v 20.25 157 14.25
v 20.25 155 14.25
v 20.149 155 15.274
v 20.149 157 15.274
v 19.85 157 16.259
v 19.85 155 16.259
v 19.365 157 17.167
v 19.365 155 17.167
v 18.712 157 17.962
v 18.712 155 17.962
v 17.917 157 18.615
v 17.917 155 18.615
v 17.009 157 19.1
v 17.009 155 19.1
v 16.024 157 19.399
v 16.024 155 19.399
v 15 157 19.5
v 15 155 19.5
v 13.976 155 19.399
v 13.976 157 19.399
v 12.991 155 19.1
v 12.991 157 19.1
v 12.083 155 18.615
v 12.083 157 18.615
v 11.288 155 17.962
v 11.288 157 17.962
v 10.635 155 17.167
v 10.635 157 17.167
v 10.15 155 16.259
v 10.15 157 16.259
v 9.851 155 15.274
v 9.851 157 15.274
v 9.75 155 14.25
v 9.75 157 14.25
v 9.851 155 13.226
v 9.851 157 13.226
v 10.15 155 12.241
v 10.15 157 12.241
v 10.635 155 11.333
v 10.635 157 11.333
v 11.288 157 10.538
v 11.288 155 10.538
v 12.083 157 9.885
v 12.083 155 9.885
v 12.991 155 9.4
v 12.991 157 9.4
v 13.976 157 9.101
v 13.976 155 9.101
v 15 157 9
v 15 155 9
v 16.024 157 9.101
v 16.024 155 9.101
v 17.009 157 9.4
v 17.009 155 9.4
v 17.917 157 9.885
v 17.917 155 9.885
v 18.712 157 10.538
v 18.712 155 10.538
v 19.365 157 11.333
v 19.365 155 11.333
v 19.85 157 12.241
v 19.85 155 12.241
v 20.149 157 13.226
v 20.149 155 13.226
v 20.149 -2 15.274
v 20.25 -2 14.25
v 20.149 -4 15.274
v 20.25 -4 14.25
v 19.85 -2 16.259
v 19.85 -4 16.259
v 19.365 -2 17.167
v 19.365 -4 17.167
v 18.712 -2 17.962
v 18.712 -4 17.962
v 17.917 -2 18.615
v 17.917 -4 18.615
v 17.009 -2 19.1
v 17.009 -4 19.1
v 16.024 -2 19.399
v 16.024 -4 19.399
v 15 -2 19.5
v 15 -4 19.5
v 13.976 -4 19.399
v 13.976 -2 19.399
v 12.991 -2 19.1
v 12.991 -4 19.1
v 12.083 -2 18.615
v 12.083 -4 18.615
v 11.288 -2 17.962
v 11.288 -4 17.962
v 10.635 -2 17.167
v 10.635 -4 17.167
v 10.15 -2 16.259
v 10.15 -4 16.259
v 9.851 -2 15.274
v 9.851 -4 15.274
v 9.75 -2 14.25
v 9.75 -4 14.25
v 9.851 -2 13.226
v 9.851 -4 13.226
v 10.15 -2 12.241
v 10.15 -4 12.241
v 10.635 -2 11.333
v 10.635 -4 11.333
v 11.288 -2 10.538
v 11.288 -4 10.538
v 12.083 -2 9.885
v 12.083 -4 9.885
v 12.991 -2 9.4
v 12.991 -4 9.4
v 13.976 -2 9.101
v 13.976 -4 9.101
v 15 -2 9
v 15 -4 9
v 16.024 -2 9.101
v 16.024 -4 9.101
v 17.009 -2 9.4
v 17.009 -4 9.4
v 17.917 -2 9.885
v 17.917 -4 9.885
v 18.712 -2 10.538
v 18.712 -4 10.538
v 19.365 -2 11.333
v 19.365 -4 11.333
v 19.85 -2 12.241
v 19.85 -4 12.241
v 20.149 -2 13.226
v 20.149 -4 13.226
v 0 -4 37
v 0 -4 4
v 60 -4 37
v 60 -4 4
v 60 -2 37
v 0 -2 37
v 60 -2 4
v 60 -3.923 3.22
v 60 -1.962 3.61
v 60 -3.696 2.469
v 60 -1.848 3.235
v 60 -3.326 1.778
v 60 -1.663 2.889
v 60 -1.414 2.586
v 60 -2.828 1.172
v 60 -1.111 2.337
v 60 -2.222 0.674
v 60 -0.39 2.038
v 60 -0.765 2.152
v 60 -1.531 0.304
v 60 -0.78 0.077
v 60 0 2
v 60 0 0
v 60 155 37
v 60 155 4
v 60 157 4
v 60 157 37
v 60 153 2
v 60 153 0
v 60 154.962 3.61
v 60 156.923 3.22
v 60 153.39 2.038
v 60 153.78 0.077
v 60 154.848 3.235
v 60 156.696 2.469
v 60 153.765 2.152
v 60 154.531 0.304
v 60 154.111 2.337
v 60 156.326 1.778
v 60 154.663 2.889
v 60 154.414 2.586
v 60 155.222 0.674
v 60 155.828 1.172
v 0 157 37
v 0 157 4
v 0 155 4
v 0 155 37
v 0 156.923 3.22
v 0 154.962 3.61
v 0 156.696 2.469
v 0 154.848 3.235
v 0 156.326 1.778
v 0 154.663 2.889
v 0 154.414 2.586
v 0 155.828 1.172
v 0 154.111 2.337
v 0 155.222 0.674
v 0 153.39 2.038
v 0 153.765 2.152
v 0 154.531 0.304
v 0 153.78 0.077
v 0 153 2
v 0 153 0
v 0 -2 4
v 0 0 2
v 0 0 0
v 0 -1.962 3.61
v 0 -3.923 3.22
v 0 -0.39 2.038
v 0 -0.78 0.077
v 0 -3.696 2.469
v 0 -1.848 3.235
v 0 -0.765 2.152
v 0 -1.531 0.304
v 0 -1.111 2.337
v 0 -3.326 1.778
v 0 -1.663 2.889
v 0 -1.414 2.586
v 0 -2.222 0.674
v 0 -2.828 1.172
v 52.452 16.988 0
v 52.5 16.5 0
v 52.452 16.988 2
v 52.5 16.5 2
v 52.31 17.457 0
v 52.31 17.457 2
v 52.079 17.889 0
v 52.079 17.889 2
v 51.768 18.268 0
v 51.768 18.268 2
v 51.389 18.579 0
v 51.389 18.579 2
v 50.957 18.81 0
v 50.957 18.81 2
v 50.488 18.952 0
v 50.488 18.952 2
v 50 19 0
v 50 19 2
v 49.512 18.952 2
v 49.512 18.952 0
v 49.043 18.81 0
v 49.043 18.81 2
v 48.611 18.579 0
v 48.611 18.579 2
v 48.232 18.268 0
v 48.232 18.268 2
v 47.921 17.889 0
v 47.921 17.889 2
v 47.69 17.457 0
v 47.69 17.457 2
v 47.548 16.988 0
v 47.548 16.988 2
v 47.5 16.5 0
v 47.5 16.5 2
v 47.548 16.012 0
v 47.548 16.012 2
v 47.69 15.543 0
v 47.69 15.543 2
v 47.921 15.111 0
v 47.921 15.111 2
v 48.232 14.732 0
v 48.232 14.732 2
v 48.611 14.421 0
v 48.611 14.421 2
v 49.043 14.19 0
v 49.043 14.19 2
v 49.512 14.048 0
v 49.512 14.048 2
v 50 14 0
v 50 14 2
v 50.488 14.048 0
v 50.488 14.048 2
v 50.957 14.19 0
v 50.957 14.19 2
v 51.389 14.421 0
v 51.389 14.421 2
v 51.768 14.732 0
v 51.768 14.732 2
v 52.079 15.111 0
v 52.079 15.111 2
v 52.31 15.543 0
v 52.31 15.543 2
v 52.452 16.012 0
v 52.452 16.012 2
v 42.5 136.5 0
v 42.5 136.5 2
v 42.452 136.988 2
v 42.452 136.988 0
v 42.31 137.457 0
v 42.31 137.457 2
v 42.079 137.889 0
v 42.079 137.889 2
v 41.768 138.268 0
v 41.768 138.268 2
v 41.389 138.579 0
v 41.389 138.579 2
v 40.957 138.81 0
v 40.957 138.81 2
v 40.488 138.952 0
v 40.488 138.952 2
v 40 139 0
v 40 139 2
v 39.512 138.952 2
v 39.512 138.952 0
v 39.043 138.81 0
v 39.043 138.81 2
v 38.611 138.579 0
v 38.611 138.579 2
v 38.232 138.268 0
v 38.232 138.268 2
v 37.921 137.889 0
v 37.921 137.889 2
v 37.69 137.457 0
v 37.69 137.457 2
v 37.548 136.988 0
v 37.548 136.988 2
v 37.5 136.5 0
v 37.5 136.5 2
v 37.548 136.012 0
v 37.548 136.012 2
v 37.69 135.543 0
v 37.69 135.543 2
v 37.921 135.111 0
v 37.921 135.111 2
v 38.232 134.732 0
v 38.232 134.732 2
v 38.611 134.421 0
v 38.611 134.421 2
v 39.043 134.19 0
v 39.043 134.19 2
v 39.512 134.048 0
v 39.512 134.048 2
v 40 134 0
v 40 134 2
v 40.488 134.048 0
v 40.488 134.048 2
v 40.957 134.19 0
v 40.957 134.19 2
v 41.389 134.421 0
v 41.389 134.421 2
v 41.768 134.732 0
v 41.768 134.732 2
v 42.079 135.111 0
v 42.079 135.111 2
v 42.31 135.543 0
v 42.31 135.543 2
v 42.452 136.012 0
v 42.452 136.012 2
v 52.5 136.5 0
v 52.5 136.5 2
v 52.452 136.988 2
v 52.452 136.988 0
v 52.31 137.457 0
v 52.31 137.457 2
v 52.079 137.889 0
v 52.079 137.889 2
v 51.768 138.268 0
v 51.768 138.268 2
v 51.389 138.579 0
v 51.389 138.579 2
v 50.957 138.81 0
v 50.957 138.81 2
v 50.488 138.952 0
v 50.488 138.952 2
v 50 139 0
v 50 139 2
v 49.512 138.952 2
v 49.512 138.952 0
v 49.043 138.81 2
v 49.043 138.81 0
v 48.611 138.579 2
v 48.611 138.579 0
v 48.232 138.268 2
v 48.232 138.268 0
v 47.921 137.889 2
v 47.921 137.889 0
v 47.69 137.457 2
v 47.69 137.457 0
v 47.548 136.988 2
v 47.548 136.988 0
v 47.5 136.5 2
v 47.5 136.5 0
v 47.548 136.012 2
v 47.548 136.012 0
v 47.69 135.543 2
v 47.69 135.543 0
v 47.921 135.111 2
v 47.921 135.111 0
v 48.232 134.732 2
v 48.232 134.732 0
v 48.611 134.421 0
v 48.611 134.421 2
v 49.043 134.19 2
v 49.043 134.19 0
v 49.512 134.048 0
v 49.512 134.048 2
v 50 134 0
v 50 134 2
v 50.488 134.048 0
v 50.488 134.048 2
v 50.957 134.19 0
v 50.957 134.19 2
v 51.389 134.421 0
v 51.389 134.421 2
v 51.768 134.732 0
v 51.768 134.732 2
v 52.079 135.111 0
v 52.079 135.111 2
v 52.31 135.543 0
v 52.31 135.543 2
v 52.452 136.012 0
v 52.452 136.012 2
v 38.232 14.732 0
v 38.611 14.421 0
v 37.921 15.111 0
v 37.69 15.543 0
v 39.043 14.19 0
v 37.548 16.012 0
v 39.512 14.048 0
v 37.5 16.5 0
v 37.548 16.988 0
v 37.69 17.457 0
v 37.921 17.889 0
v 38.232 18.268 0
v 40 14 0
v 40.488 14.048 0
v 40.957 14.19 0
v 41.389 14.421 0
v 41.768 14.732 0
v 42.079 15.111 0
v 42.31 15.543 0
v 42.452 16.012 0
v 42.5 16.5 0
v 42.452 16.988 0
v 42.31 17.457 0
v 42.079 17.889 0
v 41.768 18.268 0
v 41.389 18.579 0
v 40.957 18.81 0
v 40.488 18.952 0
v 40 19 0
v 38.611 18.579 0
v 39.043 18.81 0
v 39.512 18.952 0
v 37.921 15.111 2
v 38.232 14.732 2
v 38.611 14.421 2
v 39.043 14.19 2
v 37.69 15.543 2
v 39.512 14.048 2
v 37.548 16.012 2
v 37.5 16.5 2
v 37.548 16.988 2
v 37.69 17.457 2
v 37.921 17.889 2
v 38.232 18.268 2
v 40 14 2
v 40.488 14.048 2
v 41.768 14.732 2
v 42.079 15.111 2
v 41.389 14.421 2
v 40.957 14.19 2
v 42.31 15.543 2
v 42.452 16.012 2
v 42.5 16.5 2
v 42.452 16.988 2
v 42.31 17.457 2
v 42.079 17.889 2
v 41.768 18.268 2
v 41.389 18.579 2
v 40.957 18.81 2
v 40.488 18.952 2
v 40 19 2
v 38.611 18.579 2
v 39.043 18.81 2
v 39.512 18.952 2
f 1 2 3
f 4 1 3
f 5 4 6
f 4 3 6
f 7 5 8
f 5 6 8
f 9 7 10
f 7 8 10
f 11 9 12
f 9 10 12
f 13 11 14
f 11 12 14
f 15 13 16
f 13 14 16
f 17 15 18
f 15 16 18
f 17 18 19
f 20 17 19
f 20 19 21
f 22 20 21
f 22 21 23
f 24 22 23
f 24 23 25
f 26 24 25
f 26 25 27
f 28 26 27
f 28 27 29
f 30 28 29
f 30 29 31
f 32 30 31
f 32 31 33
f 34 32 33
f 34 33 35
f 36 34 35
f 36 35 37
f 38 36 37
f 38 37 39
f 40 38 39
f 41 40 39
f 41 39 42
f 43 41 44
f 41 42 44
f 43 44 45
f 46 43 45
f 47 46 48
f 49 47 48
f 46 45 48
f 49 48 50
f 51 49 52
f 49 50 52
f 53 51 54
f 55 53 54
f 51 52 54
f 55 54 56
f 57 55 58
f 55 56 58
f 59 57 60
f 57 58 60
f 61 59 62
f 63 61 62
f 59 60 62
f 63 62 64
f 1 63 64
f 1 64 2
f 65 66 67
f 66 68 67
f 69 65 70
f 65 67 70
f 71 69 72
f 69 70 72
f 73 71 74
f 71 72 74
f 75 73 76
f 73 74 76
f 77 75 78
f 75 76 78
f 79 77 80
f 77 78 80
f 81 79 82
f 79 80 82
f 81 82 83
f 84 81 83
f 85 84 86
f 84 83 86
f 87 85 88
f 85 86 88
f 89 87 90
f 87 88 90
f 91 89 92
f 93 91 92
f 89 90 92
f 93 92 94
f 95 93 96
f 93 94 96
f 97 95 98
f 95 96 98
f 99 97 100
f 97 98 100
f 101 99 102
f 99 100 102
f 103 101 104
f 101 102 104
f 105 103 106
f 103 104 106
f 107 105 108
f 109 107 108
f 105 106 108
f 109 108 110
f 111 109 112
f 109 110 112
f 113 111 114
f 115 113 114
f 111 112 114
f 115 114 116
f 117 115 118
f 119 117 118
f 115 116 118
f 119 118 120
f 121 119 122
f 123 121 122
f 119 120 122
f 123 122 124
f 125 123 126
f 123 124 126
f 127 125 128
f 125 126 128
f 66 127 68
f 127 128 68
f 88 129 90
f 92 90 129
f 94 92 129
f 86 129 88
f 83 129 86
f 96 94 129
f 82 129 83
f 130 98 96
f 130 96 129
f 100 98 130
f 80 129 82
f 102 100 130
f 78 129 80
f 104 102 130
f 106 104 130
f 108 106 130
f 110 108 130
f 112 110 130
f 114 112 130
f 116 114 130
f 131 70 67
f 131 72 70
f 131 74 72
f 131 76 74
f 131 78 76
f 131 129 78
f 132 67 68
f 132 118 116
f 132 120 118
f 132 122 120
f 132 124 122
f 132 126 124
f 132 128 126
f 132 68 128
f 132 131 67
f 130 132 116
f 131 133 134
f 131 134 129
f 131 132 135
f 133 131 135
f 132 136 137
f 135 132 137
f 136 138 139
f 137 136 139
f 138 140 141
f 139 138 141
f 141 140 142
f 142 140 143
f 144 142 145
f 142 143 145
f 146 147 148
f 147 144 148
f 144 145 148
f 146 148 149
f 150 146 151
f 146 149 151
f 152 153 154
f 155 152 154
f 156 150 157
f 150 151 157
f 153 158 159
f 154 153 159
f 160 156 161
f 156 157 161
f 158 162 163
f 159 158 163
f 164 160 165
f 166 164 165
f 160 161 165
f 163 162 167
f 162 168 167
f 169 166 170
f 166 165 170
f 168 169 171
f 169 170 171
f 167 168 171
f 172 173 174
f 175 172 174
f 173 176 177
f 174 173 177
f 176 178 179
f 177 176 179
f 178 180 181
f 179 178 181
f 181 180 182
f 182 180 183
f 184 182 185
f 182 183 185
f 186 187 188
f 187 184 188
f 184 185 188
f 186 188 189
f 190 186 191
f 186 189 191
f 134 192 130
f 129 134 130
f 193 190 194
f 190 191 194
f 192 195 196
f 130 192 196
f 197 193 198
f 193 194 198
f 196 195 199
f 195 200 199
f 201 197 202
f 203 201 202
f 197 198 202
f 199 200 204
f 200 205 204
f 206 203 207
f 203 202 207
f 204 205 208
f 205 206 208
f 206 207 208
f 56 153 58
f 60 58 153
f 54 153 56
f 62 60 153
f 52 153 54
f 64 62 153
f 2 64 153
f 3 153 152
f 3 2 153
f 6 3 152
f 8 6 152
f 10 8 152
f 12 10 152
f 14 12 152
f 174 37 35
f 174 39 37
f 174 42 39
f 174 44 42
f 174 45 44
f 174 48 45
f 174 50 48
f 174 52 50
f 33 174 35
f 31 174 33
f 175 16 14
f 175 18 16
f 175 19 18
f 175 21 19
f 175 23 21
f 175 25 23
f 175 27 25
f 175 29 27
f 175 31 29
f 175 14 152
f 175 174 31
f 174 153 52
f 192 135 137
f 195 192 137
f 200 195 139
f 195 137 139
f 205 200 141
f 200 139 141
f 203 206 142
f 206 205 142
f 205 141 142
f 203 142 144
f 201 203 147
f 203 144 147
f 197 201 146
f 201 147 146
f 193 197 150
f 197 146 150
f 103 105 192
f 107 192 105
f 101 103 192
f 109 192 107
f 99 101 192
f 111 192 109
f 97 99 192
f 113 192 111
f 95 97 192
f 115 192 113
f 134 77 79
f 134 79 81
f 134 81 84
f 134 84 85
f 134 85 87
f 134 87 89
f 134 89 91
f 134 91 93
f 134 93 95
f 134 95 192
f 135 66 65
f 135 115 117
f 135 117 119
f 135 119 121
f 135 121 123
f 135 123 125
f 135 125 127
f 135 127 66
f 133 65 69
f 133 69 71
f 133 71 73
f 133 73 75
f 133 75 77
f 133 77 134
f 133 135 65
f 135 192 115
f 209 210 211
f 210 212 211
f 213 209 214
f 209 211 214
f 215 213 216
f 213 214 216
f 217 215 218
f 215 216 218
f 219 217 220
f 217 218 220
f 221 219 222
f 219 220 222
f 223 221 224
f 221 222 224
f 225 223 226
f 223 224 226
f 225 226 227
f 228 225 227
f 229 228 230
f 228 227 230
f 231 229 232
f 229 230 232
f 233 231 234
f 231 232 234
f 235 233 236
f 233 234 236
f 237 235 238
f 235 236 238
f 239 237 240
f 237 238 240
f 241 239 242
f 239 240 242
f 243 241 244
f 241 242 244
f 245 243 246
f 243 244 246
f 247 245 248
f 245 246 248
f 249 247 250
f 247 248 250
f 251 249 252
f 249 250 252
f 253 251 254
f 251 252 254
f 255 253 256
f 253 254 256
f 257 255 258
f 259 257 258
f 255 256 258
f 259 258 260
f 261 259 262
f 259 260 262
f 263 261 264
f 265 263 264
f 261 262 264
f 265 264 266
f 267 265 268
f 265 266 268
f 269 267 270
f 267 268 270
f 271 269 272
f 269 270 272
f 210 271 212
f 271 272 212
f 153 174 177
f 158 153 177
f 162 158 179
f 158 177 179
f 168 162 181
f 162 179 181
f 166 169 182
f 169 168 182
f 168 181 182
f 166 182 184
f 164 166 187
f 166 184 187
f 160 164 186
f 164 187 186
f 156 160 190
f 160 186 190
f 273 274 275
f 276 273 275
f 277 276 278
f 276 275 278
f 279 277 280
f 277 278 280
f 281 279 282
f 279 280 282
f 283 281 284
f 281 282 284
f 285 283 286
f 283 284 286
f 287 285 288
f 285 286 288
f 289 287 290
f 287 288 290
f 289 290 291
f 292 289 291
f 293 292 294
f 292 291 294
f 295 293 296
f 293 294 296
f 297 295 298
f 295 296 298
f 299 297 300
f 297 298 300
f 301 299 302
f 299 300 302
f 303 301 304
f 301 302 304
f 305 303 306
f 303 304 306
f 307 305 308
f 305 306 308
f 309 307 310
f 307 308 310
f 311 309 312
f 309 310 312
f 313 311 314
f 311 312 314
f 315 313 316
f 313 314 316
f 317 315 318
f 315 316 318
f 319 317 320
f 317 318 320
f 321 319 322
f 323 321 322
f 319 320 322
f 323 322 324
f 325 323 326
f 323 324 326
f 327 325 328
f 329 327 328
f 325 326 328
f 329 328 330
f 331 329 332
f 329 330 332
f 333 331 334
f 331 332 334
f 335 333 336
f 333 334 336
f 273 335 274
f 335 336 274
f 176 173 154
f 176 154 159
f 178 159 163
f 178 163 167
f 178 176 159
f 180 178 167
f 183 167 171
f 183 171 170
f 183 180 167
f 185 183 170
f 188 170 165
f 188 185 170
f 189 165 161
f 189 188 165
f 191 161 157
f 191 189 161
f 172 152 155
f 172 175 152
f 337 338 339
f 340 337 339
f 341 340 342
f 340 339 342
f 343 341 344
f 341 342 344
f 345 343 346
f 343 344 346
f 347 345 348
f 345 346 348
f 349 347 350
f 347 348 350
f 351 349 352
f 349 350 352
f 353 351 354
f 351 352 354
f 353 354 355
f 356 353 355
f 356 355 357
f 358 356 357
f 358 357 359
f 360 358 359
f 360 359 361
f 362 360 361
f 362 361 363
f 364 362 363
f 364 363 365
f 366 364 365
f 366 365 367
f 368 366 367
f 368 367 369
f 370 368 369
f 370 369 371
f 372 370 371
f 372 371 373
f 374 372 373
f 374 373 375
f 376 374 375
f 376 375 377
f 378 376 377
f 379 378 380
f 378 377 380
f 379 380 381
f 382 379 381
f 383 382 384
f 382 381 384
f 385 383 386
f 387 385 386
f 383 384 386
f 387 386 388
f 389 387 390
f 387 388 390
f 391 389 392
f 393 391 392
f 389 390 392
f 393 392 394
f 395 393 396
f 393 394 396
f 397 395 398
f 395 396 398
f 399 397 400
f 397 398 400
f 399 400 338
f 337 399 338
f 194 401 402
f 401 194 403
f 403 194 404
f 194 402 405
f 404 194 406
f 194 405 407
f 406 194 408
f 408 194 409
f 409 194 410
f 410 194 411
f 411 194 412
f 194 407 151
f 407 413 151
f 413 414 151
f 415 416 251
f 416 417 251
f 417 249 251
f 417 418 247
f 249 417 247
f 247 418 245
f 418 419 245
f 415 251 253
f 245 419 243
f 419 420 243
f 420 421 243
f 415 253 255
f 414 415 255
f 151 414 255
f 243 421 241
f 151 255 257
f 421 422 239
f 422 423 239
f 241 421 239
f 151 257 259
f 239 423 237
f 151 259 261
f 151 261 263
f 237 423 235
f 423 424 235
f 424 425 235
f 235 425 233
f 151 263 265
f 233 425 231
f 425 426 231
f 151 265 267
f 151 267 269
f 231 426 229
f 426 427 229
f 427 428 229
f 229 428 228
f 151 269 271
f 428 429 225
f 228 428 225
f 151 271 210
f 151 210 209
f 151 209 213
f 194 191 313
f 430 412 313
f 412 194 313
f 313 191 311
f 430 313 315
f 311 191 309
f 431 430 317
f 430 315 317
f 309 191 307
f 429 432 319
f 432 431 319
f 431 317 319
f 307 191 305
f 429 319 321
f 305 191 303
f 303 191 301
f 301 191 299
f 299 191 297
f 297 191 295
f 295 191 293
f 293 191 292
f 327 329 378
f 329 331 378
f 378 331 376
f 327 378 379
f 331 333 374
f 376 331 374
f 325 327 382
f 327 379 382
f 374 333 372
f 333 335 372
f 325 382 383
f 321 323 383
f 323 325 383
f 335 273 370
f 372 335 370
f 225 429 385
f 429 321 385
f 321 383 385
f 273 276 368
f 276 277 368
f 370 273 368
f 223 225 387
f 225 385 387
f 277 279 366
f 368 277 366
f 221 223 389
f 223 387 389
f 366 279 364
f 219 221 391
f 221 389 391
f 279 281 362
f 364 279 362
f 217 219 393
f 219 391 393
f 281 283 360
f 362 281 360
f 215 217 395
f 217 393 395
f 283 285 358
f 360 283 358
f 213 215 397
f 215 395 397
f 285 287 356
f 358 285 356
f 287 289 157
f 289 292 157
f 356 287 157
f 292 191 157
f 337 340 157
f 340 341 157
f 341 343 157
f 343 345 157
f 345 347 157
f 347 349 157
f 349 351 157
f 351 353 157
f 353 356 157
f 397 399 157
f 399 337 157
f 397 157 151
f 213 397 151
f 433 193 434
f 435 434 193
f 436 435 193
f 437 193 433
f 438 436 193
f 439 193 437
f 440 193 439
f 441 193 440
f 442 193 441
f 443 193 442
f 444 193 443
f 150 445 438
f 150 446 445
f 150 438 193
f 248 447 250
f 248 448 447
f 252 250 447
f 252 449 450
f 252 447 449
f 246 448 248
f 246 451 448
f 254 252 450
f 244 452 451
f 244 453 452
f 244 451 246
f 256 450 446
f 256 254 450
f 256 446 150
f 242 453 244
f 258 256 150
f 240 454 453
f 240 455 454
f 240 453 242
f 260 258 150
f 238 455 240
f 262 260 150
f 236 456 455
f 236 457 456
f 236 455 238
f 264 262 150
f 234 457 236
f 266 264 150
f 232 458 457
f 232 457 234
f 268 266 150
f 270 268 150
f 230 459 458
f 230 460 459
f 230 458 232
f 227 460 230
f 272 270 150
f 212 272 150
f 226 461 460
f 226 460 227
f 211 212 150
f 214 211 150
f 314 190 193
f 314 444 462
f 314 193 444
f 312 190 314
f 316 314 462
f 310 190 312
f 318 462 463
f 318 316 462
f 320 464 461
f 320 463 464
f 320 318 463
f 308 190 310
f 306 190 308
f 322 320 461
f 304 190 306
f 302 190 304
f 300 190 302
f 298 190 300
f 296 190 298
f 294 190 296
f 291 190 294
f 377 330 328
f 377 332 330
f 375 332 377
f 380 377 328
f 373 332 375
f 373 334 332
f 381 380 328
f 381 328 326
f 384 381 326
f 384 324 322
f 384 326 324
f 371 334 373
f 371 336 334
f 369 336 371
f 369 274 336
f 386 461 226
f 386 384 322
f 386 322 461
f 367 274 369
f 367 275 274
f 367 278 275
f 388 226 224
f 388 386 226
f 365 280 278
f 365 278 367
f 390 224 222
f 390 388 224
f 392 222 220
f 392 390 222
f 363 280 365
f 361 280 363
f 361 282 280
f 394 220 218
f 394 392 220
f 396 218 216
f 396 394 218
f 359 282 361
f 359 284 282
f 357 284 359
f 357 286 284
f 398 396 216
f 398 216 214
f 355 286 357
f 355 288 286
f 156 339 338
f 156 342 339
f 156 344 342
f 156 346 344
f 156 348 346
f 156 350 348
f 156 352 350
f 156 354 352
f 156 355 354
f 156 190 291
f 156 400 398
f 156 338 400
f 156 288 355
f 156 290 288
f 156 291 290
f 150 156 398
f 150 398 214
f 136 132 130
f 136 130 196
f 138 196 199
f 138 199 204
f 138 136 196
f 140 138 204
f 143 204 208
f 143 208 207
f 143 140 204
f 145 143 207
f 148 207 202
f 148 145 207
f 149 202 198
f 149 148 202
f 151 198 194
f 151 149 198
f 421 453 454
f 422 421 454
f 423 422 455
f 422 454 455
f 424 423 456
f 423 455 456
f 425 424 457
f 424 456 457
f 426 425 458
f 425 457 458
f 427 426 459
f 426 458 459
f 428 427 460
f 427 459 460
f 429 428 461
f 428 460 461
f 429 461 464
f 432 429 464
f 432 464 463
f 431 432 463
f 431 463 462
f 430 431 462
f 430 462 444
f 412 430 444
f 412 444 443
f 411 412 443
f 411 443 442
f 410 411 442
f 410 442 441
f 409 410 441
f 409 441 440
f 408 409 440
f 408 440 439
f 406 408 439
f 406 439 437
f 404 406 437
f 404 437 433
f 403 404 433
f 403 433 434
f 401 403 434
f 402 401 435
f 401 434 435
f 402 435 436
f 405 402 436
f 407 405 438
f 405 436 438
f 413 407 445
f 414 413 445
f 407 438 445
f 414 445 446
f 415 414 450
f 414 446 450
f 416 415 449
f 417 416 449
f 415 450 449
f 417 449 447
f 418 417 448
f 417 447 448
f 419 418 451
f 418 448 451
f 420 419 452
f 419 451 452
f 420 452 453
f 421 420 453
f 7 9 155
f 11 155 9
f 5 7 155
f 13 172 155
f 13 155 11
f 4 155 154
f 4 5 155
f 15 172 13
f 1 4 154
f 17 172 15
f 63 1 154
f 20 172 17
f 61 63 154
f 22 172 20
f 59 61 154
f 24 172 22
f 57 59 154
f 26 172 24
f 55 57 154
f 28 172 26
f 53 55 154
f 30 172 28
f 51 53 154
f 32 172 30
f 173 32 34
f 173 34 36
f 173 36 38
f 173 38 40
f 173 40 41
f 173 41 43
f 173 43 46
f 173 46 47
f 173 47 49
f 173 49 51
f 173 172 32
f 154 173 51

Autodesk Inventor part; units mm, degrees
ref_plane "YZ Plane" through (0, 0, 0) normal (1, 0, 0) x (0, 1, 0)
ref_plane "XZ Plane" through (0, 0, 0) normal (0, 1, 0) x (-1, 0, 0)
ref_plane "XY Plane" through (0, 0, 0) normal (0, 0, 1) x (1, 0, 0)
sketch "Sketch1" plane through (0, 0, 0) normal (0, 0, 1) x (1, 0, 0)
  line L0 (0, 0) -> (60, 0)
  line L1 (60, 0) -> (60, 153)
  line L2 (60, 153) -> (0, 153)
  line L3 (0, 153) -> (0, 0)
  dimension "d0" = 153
  dimension "d1" = 60
extrude "Plate1" add sketch "Sketch1" along normal blind 2
sketch "Sketch2" plane through (60, -2, 4) normal (0, -1, 0) x (1, 0, 0)
  line L0 (-60, 0) -> (0, 0)
  line L1 (0, 0) -> (0, 33)
  line L2 (0, 33) -> (-60, 33)
  line L3 (-60, 33) -> (-60, 0)
edge flange "Flange1" height 35 angle 90 thickness 2 bend radius 2 thickness toward (0, -1, 0) relief tear relief width 2 relief depth 1 corner gap 2 corner form 0 edges at (30, 0, 2) (30, 153, 2) wall of the first edge with corners at (0, -2, 4) (60, -2, 4) (60, -2, 37) (0, -2, 37)
bend "Bend1"
corner "Corner1"
sketch "Sketch3" plane through (0, -4, 37) normal (0, -1, 0) x (1, 0, 0)
  line L0 (0, -33) -> (60, -33) projected
  line L1 (0, -33) -> (0, 0) projected
  circle A0 centre (15, -22.75) radius 5.25
  point P0 (0, -37)
  dimension "d13" = 15
  dimension "d14" = 10.5
  dimension "d16" = 10.25
extrude "Extrusion1" cut sketch "Sketch3" against normal through all
sketch "Sketch4" plane through (0, 0, 2) normal (0, 0, 1) x (1, 0, 0)
  line L0 (0, 0) -> (0, 153) projected
  line L1 (60, 153) -> (60, 0) projected
  circle A0 centre (50, 136.5) radius 2.5
  circle A1 centre (40, 136.5) radius 2.5
  line L2 (60, 76.5) -> (0, 76.5) construction
  circle A2 centre (50, 16.5) radius 2.5
  circle A3 centre (40, 16.5) radius 2.5
  dimension "d20" = 10
  dimension "d21" = 20
  dimension "d22" = 5
  dimension "d23" = 5
  dimension "d24" = 120
extrude "Extrusion2" cut sketch "Sketch4" against normal through all
equation "\"d3\" = BendReliefWidth"
equation "\"d4\" = BendReliefDepth"
equation "\"d5\" = MinimumRemnant"
equation "\"d6\" = BendRadius"
equation "\"d9\" = BendRadius"
equation "\"d10\" = CornerReliefSize"
equation "\"d11\" = GapSize"
equation "\"d12\" = JacobiRadiusSize"
equation "\"BendRadius\" = Thickness"
equation "\"BendReliefWidth\" = Thickness"
equation "\"BendReliefDepth\" = 0.5 * Thickness"
equation "\"CornerReliefSize\" = 4 * Thickness"
equation "\"MinimumRemnant\" = 2 * Thickness"
equation "\"TransitionRadius\" = BendRadius"
equation "\"JacobiRadiusSize\" = BendRadius"
equation "\"GapSize\" = Thickness"
equation "\"d2\" = BendRadius"
equation "\"Thickness\" = 2"
properties part number "MotorPlatta"
